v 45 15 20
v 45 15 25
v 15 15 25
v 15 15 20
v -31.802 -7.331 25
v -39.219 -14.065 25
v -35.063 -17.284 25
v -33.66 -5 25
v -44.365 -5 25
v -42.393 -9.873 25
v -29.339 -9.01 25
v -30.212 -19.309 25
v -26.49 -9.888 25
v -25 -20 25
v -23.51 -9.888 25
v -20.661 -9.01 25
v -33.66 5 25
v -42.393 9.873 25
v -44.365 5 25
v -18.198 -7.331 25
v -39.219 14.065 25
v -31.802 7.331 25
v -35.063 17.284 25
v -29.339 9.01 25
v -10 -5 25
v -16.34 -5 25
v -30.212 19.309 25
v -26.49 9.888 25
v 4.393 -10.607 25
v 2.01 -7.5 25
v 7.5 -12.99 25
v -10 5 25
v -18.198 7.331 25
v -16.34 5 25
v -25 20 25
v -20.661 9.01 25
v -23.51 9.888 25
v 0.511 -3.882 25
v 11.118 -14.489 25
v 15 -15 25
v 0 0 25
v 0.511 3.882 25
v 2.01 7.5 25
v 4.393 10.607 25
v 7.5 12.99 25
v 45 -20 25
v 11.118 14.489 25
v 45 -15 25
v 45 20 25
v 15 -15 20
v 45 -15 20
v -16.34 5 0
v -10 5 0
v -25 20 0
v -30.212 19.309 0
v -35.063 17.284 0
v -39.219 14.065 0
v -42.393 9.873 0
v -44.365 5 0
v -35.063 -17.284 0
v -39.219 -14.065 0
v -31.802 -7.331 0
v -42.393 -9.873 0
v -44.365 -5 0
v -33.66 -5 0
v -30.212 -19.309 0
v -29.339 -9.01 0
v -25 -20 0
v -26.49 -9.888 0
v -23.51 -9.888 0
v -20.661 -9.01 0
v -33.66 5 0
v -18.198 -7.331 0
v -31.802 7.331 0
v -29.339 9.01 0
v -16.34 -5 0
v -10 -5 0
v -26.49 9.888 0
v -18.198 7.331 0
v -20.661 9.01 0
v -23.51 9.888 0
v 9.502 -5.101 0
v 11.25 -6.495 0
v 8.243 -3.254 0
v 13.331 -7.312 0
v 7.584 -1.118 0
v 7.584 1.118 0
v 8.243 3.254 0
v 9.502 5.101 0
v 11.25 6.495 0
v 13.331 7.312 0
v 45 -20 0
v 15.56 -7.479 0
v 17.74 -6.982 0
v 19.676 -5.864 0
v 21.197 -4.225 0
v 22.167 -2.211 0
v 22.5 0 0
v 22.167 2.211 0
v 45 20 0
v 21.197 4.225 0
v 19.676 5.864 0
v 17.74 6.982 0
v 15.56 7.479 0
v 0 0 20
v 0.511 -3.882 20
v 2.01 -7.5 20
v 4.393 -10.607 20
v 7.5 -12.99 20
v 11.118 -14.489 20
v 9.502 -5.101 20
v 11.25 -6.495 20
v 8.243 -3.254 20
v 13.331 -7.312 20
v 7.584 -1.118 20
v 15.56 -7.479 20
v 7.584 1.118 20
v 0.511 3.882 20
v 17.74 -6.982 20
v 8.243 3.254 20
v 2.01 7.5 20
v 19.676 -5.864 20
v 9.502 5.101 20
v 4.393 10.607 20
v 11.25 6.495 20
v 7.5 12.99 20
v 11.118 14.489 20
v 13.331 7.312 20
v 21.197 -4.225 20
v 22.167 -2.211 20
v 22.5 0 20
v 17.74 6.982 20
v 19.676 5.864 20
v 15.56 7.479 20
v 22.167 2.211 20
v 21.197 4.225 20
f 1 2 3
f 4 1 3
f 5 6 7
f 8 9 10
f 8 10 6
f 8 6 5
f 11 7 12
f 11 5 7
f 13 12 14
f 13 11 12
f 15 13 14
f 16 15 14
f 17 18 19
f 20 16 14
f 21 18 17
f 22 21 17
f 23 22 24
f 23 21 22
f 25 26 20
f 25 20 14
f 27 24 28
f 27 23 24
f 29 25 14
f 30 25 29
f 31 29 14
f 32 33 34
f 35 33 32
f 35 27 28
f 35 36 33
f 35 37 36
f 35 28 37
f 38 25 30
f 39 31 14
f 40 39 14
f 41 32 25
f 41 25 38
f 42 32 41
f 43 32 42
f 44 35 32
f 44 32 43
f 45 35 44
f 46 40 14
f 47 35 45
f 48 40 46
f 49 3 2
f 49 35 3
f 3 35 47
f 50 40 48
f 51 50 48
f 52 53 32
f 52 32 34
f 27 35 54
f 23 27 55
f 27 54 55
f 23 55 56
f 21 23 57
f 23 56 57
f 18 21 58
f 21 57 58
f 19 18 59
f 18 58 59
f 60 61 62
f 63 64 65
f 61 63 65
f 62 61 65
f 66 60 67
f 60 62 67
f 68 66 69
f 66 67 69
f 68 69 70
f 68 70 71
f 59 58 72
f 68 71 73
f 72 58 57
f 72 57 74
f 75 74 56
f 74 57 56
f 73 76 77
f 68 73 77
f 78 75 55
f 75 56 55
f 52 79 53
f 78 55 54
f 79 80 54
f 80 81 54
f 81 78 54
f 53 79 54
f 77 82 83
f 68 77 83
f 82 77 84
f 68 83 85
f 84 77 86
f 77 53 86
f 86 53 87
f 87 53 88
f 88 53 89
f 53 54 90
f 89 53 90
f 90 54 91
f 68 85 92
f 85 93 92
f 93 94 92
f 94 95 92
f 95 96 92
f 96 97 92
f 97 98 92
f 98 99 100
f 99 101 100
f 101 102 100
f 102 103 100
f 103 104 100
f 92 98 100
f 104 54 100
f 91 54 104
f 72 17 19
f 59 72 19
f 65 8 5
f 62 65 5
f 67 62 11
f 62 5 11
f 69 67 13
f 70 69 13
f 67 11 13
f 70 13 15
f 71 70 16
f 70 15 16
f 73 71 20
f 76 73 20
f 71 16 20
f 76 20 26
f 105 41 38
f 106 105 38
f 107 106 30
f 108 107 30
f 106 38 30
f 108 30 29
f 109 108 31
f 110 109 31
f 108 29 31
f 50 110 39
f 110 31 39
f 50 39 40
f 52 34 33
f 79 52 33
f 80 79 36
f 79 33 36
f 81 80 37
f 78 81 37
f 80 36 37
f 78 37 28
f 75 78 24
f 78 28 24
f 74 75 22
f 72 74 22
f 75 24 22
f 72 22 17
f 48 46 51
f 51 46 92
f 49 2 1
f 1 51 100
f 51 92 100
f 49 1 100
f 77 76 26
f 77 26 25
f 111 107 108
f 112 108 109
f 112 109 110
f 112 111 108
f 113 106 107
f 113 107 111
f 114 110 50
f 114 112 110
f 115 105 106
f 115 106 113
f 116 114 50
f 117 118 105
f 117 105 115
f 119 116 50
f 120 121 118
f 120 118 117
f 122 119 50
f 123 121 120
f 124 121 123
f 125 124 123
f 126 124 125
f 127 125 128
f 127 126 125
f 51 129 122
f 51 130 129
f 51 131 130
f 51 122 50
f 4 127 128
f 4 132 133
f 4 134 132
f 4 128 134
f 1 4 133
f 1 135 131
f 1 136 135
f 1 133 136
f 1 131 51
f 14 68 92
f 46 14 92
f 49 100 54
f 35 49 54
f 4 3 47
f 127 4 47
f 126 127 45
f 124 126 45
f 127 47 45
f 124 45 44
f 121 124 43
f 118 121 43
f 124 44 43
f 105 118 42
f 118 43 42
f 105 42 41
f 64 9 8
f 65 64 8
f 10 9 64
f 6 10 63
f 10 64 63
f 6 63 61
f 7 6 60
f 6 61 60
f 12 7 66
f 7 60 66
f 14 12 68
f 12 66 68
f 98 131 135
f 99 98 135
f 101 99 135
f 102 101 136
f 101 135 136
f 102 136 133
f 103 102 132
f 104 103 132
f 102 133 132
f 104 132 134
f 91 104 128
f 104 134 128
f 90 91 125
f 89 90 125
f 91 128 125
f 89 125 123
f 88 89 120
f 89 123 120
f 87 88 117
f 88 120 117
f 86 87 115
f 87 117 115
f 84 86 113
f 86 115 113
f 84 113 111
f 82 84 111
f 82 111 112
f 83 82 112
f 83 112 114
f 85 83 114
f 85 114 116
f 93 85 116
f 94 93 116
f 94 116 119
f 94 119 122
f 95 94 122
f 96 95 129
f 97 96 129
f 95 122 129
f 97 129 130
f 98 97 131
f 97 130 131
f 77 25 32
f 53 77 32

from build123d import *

# Parameters (mm, degrees)
F1_DEPTH = 25
F3_DEPTH = 25
F5_DEPTH = 5
F6_R     = 7.5
F7_DEPTH = 20


with BuildPart() as f1:
    # F0 (on Top) → F1 (new body)
    with BuildSketch(Plane.XY):
        with BuildLine():
            Line((45, -20), (45, 20))
            Line((45, 20), (-25, 20))
            ThreePointArc((-25, 20), (-39.142136, 14.142136), (-45, 0))
            ThreePointArc((-45, 0), (-39.142136, -14.142136), (-25, -20))
            Line((-25, -20), (45, -20))
        make_face()
    extrude(amount=F1_DEPTH)

    # F2 (on face) → F3 (cut, through all)
    with BuildSketch(Plane.XY.offset(25)):
        with BuildLine():
            Line((-44.364917, -5), (-33.660254, -5))
            ThreePointArc((-33.660254, -5), (-25, -10), (-16.339746, -5))
            Line((-16.339746, -5), (-10, -5))
            Line((-10, -5), (-10, 5))
            Line((-10, 5), (-16.339746, 5))
            ThreePointArc((-16.339746, 5), (-25, 10), (-33.660254, 5))
            Line((-33.660254, 5), (-44.364917, 5))
            ThreePointArc((-44.364917, 5), (-45, 0), (-44.364917, -5))
        make_face()
    extrude(amount=-F3_DEPTH, mode=Mode.SUBTRACT)

    # F4 (on face) → F5 (cut)
    with BuildSketch(Plane.XY.offset(25)):
        with BuildLine():
            Line((45, -15), (45, 15))
            Line((45, 15), (15, 15))
            ThreePointArc((15, 15), (4.393398, 10.606602), (0, 0))
            ThreePointArc((0, 0), (4.393398, -10.606602), (15, -15))
            Line((15, -15), (45, -15))
        make_face()
    extrude(amount=-F5_DEPTH, mode=Mode.SUBTRACT)

    # F6 (on face) → F7 (cut, through all)
    with BuildSketch(Plane.XY.offset(20)):
        with Locations((15, 0)):
            Circle(F6_R)
    extrude(amount=-F7_DEPTH, mode=Mode.SUBTRACT)


solid = f1.part
